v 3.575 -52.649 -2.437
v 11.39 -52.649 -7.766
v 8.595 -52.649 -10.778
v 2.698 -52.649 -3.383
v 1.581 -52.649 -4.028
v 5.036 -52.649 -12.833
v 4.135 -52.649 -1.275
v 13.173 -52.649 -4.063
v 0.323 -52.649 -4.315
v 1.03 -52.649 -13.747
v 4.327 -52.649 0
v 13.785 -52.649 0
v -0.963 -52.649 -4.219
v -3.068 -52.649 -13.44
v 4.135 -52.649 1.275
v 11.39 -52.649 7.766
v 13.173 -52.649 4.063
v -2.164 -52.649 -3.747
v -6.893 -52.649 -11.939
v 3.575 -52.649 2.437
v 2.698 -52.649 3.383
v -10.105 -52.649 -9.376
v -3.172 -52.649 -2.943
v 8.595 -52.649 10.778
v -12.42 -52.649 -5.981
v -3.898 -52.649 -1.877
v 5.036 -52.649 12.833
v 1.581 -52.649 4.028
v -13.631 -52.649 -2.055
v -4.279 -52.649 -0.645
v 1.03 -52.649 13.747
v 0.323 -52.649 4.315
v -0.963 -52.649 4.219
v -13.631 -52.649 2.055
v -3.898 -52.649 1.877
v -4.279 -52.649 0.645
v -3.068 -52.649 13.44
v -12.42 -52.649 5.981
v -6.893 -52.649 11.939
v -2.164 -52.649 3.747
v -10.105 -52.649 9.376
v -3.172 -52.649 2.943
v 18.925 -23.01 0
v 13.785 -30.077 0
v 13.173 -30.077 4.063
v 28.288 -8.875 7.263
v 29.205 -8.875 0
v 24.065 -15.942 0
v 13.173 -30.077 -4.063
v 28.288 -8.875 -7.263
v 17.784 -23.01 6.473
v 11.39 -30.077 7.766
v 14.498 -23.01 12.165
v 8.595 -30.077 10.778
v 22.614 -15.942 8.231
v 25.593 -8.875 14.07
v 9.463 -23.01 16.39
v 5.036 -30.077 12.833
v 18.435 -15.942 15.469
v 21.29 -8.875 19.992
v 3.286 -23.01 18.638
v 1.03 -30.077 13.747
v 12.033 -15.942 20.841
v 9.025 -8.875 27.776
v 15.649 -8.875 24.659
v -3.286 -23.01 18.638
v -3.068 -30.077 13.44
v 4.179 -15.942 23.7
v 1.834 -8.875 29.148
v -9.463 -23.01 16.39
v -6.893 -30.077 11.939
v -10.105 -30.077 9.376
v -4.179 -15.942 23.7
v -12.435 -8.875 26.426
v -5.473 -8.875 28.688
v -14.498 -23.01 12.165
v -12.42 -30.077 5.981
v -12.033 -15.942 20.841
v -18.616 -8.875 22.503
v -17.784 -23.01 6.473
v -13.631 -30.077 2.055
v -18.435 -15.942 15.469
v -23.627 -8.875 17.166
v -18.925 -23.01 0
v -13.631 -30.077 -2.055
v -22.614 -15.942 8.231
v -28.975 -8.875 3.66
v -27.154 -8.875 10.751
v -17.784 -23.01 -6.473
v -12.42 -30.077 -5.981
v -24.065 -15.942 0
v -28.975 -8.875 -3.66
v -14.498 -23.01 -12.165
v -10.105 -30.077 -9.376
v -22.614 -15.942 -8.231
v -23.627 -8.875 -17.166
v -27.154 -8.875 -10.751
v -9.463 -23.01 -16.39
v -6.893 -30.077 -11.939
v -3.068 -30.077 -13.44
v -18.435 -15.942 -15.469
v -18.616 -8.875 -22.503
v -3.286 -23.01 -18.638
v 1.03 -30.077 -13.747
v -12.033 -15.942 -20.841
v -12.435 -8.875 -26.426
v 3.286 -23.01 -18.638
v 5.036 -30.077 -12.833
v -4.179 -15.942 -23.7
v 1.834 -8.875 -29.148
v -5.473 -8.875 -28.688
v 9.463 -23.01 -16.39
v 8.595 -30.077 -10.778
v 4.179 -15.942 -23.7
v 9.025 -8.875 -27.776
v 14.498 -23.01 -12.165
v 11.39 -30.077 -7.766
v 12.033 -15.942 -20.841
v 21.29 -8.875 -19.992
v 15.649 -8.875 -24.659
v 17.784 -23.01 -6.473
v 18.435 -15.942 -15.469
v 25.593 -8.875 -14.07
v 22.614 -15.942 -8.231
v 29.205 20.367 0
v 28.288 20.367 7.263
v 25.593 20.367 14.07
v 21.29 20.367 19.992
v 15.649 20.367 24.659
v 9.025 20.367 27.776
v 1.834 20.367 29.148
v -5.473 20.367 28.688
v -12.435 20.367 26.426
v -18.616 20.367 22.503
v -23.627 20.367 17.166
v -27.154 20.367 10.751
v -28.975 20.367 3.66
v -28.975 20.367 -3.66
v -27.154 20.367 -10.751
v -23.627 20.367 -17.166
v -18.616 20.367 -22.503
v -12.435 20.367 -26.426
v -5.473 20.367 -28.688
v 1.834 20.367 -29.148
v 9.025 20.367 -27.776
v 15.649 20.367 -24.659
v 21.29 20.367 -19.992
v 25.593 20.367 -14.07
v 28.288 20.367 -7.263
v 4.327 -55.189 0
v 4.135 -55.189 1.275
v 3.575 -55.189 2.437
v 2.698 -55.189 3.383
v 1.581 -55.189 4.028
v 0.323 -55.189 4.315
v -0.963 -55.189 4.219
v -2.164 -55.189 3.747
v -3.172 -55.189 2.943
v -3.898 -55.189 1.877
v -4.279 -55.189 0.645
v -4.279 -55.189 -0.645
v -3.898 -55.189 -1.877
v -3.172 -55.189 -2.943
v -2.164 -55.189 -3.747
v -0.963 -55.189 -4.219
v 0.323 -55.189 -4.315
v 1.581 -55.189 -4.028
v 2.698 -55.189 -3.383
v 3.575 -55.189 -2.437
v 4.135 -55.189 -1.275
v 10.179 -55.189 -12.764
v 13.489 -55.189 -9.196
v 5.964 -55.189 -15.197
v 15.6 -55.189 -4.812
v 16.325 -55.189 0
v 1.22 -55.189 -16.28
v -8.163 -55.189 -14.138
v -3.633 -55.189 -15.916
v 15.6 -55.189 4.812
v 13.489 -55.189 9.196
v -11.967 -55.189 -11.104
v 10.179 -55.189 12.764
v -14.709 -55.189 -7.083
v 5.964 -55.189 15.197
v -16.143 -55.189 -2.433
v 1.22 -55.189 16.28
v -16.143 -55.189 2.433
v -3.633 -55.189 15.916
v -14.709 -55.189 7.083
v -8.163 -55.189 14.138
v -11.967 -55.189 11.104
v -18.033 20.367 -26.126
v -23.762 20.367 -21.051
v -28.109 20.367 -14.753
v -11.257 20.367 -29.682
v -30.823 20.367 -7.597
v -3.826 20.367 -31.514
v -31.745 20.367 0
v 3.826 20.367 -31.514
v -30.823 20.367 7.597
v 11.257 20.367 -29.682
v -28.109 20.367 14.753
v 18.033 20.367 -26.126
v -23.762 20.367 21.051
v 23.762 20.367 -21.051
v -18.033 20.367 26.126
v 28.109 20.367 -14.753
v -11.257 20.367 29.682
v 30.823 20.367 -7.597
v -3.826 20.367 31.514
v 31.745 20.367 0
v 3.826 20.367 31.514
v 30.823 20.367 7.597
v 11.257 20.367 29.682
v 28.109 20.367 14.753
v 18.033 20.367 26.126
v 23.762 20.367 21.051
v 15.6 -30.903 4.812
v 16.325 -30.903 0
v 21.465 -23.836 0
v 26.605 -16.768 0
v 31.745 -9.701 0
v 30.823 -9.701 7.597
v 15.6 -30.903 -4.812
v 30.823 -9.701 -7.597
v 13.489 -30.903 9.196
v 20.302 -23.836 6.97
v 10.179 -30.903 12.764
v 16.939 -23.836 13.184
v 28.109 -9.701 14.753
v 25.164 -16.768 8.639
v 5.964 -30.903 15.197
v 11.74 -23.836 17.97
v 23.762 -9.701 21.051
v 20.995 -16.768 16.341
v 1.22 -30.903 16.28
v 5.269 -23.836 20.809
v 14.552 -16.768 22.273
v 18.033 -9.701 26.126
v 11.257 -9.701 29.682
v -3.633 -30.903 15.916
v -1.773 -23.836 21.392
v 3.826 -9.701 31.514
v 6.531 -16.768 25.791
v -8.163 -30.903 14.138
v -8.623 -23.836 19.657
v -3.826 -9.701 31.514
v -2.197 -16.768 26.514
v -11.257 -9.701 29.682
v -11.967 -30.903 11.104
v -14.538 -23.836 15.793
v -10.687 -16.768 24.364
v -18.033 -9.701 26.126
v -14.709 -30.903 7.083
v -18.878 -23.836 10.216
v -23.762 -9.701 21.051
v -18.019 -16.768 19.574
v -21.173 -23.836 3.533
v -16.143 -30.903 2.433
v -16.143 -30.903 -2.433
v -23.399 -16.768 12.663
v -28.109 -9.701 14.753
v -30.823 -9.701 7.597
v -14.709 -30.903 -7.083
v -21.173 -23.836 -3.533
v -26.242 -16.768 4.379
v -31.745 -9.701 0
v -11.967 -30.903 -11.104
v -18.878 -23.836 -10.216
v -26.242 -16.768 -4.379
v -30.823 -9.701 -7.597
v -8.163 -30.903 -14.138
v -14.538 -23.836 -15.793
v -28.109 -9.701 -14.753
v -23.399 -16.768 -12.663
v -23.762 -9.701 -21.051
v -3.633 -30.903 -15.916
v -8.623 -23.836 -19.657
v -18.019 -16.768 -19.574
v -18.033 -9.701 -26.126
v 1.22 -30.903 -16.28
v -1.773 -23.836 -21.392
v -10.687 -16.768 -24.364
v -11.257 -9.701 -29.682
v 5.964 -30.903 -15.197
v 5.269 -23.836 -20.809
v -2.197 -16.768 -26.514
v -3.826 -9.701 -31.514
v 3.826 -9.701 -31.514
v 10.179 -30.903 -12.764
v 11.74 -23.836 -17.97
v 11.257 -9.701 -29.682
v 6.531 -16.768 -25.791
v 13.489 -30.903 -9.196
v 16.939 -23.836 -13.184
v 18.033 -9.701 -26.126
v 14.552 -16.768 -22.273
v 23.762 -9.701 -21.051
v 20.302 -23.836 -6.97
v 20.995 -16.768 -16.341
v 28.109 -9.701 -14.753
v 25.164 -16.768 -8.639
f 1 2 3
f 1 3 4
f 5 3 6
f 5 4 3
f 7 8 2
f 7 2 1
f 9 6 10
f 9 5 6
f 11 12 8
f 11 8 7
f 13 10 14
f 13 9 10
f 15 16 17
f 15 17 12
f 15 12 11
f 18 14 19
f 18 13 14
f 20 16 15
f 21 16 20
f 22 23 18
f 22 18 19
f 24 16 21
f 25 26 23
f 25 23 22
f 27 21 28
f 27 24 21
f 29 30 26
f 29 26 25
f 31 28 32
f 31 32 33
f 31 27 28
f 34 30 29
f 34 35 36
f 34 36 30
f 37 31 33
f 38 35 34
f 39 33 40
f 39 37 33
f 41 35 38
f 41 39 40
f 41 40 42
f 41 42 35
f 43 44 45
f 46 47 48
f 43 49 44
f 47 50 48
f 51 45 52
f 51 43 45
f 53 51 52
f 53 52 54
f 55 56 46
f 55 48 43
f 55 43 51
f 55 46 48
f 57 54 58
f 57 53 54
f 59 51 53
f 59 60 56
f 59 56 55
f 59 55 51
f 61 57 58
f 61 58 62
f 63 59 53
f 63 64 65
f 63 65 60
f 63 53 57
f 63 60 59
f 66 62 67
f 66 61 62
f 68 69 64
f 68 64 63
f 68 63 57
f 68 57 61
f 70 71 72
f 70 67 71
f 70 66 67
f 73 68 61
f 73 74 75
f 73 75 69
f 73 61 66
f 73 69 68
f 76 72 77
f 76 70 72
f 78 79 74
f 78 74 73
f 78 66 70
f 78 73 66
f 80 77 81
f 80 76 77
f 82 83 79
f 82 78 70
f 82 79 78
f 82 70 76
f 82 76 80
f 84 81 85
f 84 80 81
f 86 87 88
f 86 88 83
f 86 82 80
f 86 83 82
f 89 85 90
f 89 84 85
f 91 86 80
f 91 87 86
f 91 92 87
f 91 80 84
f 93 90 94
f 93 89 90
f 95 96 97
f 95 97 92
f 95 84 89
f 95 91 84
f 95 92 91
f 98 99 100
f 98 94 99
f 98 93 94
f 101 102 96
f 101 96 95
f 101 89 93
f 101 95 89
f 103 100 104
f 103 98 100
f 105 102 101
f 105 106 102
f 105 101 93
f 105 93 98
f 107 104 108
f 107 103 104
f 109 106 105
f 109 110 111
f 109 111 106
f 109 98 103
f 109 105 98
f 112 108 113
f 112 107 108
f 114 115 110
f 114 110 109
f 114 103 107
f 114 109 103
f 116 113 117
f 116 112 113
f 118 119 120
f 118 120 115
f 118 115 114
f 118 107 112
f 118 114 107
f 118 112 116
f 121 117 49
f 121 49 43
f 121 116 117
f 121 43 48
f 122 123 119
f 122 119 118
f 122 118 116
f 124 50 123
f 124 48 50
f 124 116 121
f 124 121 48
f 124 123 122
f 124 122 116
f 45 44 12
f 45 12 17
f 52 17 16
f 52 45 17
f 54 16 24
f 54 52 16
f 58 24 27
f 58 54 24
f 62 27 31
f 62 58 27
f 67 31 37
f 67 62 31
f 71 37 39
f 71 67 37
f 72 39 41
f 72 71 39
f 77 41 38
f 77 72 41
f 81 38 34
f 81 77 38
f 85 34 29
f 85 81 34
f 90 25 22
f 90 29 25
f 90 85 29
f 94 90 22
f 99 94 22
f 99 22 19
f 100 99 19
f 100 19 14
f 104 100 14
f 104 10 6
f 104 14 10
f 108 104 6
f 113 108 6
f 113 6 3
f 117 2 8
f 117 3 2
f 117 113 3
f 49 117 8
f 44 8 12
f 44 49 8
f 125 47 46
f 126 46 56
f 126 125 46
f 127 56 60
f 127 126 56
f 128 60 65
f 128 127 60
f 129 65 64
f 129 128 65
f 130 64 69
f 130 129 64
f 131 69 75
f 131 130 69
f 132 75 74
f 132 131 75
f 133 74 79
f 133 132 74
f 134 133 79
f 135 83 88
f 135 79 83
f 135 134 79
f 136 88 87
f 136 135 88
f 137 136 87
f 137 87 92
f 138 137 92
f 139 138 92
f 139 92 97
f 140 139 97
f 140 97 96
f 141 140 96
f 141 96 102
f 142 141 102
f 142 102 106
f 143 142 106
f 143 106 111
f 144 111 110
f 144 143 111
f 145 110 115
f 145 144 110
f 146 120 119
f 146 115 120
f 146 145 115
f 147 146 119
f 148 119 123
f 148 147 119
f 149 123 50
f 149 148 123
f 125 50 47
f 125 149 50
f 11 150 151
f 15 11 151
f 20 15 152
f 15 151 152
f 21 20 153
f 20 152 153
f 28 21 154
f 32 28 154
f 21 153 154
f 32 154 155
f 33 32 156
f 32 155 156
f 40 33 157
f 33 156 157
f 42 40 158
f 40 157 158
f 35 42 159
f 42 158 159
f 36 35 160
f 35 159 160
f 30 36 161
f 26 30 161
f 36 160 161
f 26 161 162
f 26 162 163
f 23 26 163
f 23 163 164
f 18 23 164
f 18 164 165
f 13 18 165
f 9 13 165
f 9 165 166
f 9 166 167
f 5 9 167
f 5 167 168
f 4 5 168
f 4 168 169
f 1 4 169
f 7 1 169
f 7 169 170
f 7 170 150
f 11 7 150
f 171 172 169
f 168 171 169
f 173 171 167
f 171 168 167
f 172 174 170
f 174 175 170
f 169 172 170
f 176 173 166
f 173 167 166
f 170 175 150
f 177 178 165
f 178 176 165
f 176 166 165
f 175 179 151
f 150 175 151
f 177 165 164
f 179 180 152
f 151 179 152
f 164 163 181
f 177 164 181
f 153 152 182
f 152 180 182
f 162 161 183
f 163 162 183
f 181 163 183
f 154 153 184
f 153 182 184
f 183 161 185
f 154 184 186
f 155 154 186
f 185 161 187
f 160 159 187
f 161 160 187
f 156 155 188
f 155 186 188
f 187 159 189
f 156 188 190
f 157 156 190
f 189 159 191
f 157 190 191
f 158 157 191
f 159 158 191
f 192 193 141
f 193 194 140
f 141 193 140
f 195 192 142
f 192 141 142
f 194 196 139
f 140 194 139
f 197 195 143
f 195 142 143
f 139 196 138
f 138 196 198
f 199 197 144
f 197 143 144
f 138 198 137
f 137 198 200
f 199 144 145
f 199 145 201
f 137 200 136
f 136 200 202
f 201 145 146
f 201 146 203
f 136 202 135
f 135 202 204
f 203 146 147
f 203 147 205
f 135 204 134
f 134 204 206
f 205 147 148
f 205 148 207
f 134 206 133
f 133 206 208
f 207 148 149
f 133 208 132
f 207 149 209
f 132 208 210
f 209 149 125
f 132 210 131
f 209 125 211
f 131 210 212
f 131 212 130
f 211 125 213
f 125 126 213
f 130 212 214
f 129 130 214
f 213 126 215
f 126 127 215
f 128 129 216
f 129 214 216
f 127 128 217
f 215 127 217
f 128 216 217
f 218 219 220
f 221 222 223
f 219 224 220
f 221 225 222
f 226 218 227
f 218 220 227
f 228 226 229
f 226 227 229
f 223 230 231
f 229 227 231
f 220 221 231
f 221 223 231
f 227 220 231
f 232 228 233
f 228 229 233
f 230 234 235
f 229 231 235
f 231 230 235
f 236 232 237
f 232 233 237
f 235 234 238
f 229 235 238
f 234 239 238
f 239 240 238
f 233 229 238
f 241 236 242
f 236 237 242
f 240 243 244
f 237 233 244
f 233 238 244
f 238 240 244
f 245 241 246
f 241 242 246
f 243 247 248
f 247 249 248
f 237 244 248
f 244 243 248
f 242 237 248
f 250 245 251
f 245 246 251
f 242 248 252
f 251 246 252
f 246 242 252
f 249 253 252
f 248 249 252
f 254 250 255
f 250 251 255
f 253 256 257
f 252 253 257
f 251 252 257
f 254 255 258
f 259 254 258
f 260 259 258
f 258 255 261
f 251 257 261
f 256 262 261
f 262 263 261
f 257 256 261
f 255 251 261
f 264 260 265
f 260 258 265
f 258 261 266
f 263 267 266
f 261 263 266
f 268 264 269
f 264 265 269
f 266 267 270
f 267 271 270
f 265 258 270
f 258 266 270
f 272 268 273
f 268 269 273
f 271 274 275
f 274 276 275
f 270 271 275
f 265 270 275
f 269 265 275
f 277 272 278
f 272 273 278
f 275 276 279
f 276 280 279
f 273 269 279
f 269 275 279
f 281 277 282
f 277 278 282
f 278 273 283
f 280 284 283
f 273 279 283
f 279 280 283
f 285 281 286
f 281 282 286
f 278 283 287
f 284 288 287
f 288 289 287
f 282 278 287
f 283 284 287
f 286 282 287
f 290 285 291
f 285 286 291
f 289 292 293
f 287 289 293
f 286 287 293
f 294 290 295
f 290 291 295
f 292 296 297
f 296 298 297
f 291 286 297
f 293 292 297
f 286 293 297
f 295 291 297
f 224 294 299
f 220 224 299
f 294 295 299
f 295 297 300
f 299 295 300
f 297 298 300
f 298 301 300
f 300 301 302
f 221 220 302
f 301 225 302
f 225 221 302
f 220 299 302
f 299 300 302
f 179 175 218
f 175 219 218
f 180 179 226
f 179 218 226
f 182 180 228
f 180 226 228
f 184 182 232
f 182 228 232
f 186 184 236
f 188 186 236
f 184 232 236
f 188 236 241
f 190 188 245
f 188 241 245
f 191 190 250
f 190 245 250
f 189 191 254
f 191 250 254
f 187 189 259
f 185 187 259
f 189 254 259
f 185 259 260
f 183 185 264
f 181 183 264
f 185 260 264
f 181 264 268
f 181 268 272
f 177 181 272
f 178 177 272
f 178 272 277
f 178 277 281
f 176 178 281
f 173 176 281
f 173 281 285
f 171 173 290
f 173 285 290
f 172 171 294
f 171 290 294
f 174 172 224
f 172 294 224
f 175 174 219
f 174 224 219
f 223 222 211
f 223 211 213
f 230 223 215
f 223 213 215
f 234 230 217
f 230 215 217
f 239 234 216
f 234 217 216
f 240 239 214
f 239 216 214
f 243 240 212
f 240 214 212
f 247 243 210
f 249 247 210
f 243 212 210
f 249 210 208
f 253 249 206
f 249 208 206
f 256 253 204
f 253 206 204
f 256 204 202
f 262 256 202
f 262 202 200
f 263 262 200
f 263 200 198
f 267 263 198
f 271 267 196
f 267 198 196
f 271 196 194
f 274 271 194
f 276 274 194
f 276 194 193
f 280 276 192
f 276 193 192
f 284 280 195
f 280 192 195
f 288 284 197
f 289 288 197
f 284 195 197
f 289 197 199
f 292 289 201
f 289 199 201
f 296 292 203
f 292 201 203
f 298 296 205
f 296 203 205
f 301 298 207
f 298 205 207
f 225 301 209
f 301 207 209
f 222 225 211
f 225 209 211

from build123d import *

# Parameters (mm, degrees)
F3_T     = -2.54
F2_R     = 4.327006367
F4_DEPTH = 75.5575296859


with BuildPart() as f1:
    # F0 (on Top) → F1 (revolve)
    with BuildSketch(Plane.XY):
        Polygon((0, 20.3673411161), (0, -55.1891885698), (16.3254532963, -55.1891885698), (16.3254532963, -30.9031605721), (31.7451581359, -9.701074101), (31.7451581359, 20.3673411161), align=None)
    revolve(axis=Axis((0, -6.6171362996, 0), (0, -1, 0)))

    # F3
    f3_openings = [f1.faces().sort_by_distance(p)[0] for p in [
        (0, 20.367341, 0),
    ]]
    offset(amount=F3_T, openings=f3_openings, kind=Kind.INTERSECTION)

    # F2 (on face) → F4 (cut, through all)
    with BuildSketch(Plane.XZ.offset(55.1891885698)):
        Circle(F2_R)
    extrude(amount=-F4_DEPTH, mode=Mode.SUBTRACT)


solid = f1.part
